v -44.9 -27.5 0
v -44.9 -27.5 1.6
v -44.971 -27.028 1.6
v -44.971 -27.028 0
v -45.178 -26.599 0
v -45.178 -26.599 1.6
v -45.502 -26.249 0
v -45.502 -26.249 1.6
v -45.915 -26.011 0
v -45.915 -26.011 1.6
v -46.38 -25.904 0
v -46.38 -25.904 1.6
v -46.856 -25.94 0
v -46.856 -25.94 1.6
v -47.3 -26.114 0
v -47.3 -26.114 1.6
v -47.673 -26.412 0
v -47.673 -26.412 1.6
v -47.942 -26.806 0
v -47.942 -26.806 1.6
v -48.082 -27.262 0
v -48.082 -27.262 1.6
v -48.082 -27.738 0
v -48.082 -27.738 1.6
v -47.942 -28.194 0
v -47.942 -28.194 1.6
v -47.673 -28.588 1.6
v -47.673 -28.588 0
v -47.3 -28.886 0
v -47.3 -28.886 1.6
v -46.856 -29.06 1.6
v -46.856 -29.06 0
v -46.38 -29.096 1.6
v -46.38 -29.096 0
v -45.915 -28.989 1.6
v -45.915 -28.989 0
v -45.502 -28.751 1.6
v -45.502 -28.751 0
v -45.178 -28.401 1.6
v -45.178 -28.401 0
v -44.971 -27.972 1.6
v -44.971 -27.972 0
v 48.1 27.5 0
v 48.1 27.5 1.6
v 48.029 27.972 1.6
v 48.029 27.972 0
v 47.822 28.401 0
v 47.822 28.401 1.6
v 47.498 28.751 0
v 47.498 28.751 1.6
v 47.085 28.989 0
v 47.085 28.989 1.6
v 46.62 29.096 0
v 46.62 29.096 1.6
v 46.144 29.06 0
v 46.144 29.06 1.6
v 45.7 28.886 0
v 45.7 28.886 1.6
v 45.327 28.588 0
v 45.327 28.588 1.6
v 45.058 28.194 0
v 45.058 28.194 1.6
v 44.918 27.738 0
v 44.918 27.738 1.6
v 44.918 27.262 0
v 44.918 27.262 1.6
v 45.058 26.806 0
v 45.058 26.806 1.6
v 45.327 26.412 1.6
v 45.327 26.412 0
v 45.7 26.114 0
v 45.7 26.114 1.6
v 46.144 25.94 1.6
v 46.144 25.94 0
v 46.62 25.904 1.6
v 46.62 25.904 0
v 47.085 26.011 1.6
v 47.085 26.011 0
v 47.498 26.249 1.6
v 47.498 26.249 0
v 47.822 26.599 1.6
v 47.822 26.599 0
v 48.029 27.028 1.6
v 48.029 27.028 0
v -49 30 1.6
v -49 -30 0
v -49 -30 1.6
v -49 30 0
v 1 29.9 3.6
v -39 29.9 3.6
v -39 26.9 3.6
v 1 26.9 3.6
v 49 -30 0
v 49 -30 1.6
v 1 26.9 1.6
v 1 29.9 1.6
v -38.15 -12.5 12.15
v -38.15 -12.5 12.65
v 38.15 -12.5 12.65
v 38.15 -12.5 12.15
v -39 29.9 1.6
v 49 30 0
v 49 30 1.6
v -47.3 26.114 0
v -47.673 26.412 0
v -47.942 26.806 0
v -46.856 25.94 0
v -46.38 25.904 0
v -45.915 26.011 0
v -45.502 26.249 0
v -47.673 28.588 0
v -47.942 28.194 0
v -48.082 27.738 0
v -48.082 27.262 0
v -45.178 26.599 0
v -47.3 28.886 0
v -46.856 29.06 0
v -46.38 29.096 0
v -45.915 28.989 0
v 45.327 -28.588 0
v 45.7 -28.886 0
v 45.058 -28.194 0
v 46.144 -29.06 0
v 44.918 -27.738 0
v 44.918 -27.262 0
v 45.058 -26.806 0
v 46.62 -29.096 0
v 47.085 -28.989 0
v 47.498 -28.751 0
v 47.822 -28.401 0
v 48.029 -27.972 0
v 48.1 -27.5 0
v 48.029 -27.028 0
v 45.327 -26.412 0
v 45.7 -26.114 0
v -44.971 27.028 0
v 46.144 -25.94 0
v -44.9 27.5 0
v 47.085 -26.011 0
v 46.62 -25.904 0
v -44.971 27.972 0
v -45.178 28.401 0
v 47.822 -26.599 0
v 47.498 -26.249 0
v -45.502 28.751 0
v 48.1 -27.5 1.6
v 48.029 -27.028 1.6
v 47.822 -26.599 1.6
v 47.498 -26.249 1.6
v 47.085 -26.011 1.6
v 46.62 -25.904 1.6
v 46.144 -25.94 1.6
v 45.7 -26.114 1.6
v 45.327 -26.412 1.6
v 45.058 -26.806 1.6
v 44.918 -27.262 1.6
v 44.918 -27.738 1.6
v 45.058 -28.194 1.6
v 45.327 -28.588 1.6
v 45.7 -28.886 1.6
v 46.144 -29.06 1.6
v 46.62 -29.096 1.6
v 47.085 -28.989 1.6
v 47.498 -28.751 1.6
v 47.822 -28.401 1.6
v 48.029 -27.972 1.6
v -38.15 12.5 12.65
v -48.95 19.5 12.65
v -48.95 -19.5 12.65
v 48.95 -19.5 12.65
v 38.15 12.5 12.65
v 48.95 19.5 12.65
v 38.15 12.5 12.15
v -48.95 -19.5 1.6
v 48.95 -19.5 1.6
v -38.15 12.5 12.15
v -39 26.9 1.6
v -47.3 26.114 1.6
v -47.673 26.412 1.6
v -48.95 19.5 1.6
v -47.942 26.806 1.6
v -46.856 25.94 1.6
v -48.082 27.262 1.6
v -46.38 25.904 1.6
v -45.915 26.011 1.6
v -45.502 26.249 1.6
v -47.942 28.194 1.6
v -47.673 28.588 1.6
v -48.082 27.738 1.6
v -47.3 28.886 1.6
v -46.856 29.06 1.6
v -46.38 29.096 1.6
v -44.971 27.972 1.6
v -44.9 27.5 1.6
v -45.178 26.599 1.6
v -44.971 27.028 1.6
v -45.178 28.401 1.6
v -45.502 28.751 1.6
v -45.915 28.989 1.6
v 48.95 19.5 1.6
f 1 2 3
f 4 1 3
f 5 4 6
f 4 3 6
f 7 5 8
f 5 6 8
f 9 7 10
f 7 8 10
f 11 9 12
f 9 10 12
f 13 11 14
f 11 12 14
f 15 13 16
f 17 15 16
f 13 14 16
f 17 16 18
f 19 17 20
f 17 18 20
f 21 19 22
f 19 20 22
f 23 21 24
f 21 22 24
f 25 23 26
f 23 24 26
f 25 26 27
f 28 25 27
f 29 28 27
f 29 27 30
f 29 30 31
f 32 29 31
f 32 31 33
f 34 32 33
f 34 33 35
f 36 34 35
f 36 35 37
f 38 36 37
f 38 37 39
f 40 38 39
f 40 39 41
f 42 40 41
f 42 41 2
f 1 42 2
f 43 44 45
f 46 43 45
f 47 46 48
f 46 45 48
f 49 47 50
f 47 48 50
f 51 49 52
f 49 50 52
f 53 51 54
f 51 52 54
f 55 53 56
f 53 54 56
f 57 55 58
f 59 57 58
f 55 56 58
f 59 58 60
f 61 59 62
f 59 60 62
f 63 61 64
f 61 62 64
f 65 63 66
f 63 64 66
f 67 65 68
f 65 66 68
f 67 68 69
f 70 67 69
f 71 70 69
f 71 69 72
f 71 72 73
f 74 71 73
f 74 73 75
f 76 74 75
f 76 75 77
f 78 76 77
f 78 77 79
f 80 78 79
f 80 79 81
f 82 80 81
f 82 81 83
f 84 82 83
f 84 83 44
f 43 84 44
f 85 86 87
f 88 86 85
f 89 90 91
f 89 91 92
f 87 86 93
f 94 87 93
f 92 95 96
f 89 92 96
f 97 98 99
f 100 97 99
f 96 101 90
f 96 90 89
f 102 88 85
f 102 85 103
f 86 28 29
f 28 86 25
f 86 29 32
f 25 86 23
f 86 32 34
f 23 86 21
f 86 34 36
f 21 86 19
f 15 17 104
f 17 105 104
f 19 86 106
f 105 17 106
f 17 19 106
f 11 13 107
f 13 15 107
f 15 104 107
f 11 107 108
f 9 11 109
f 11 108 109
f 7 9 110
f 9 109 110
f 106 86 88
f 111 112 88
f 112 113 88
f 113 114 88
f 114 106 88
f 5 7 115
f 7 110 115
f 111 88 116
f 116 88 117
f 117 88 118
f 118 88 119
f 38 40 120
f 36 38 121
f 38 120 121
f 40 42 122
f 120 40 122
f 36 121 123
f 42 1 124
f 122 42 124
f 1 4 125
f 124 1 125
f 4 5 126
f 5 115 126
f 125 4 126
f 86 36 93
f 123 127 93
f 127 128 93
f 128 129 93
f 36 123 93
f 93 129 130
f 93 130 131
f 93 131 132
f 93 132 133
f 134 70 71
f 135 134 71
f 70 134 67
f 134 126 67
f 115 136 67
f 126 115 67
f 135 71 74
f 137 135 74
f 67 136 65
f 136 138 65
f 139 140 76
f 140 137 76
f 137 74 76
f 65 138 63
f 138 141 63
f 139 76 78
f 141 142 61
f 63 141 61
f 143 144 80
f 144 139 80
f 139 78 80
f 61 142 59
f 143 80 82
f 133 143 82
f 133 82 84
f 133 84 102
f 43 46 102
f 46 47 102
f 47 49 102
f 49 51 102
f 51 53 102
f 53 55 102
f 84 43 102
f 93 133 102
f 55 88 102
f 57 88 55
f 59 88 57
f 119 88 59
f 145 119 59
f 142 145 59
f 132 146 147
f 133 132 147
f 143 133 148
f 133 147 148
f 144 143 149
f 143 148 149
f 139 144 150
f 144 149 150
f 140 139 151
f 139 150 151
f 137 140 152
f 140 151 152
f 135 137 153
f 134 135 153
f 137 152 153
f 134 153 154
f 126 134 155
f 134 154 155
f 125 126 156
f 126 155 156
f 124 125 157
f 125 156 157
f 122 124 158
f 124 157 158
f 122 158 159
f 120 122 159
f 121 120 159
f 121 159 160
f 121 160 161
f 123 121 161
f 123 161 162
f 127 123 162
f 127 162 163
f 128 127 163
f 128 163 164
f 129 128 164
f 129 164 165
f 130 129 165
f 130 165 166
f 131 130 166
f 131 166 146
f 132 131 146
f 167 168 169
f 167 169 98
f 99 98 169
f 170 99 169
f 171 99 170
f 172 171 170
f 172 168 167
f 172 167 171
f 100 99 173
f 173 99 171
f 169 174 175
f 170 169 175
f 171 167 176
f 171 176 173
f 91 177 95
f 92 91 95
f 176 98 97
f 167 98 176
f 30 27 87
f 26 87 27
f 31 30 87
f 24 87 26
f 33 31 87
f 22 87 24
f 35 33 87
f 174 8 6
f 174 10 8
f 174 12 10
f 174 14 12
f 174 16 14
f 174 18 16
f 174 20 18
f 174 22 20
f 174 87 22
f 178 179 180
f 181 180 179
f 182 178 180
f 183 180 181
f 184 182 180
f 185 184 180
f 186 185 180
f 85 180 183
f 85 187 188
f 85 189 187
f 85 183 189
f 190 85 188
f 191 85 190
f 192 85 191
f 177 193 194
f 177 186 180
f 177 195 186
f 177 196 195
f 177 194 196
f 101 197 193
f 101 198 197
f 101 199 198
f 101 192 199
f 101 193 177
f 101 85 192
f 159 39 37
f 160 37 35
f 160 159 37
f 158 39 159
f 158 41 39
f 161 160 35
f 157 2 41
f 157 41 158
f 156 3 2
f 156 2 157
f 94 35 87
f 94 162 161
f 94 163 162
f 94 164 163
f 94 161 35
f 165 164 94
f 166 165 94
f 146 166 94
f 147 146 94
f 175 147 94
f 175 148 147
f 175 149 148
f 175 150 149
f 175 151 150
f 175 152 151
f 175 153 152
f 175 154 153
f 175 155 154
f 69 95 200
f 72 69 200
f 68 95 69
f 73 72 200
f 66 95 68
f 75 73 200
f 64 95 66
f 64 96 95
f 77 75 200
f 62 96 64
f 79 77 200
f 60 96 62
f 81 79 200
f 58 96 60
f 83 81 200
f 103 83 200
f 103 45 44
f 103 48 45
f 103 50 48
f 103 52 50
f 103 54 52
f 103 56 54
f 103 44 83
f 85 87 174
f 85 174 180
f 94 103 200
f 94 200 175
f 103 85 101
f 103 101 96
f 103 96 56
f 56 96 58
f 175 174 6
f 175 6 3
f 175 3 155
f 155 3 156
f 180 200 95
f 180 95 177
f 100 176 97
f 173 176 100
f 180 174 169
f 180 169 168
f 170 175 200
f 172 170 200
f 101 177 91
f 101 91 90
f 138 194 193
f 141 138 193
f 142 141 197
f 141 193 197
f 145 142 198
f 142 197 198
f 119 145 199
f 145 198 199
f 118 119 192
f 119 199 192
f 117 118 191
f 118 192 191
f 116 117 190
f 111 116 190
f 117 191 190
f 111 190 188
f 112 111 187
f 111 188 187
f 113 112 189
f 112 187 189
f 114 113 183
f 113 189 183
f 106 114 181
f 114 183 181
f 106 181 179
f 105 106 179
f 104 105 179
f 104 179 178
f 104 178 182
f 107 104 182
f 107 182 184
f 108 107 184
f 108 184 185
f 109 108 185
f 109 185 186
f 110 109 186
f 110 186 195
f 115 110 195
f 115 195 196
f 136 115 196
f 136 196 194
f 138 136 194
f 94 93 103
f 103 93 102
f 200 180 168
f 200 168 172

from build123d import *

# Parameters (mm, degrees)
ESQUISSE1_W             = 98
ESQUISSE1_H             = 60
BOSS_EXTRU_1_DEPTH      = 1.6
ESQUISSE2_R             = 1.6
ENL_V_MAT_EXTRU_1_DEPTH = 58.476603936
ESQUISSE3_W             = 97.9
ESQUISSE3_H             = 39
BOSS_EXTRU_2_DEPTH      = 11.05
ESQUISSE4_W             = 76.3
ESQUISSE4_H             = 25
ENL_V_MAT_EXTRU_2_DEPTH = 0.5
ESQUISSE5_W             = 40
ESQUISSE5_H             = 3
BOSS_EXTRU_3_DEPTH      = 2


with BuildPart() as part:
    # Esquisse1 → Boss.-Extru.1 (new body)
    with BuildSketch(Plane.XY):
        Rectangle(ESQUISSE1_W, ESQUISSE1_H)
    extrude(amount=BOSS_EXTRU_1_DEPTH)

    # Esquisse2 → Enlèv. mat.-Extru.1 (cut, through all)
    with BuildSketch(Plane.XY.offset(1.6)):
        with Locations((-46.5, 27.5)):
            Circle(ESQUISSE2_R)
        with Locations((-46.5, -27.5)):
            Circle(ESQUISSE2_R)
        with Locations((46.5, -27.5)):
            Circle(ESQUISSE2_R)
        with Locations((46.5, 27.5)):
            Circle(ESQUISSE2_R)
    extrude(amount=-ENL_V_MAT_EXTRU_1_DEPTH, mode=Mode.SUBTRACT)

    # Esquisse3 → Boss.-Extru.2 (add)
    with BuildSketch(Plane.XY.offset(1.6)):
        Rectangle(ESQUISSE3_W, ESQUISSE3_H)
    extrude(amount=BOSS_EXTRU_2_DEPTH)

    # Esquisse4 → Enlèv. mat.-Extru.2 (cut)
    with BuildSketch(Plane.XY.offset(12.65)):
        Rectangle(ESQUISSE4_W, ESQUISSE4_H)
    extrude(amount=-ENL_V_MAT_EXTRU_2_DEPTH, mode=Mode.SUBTRACT)

    # Esquisse5 → Boss.-Extru.3 (add)
    with BuildSketch(Plane.XY.offset(1.6)):
        with Locations((-19, 28.4)):
            Rectangle(ESQUISSE5_W, ESQUISSE5_H)
    extrude(amount=BOSS_EXTRU_3_DEPTH)


solid = part.part
